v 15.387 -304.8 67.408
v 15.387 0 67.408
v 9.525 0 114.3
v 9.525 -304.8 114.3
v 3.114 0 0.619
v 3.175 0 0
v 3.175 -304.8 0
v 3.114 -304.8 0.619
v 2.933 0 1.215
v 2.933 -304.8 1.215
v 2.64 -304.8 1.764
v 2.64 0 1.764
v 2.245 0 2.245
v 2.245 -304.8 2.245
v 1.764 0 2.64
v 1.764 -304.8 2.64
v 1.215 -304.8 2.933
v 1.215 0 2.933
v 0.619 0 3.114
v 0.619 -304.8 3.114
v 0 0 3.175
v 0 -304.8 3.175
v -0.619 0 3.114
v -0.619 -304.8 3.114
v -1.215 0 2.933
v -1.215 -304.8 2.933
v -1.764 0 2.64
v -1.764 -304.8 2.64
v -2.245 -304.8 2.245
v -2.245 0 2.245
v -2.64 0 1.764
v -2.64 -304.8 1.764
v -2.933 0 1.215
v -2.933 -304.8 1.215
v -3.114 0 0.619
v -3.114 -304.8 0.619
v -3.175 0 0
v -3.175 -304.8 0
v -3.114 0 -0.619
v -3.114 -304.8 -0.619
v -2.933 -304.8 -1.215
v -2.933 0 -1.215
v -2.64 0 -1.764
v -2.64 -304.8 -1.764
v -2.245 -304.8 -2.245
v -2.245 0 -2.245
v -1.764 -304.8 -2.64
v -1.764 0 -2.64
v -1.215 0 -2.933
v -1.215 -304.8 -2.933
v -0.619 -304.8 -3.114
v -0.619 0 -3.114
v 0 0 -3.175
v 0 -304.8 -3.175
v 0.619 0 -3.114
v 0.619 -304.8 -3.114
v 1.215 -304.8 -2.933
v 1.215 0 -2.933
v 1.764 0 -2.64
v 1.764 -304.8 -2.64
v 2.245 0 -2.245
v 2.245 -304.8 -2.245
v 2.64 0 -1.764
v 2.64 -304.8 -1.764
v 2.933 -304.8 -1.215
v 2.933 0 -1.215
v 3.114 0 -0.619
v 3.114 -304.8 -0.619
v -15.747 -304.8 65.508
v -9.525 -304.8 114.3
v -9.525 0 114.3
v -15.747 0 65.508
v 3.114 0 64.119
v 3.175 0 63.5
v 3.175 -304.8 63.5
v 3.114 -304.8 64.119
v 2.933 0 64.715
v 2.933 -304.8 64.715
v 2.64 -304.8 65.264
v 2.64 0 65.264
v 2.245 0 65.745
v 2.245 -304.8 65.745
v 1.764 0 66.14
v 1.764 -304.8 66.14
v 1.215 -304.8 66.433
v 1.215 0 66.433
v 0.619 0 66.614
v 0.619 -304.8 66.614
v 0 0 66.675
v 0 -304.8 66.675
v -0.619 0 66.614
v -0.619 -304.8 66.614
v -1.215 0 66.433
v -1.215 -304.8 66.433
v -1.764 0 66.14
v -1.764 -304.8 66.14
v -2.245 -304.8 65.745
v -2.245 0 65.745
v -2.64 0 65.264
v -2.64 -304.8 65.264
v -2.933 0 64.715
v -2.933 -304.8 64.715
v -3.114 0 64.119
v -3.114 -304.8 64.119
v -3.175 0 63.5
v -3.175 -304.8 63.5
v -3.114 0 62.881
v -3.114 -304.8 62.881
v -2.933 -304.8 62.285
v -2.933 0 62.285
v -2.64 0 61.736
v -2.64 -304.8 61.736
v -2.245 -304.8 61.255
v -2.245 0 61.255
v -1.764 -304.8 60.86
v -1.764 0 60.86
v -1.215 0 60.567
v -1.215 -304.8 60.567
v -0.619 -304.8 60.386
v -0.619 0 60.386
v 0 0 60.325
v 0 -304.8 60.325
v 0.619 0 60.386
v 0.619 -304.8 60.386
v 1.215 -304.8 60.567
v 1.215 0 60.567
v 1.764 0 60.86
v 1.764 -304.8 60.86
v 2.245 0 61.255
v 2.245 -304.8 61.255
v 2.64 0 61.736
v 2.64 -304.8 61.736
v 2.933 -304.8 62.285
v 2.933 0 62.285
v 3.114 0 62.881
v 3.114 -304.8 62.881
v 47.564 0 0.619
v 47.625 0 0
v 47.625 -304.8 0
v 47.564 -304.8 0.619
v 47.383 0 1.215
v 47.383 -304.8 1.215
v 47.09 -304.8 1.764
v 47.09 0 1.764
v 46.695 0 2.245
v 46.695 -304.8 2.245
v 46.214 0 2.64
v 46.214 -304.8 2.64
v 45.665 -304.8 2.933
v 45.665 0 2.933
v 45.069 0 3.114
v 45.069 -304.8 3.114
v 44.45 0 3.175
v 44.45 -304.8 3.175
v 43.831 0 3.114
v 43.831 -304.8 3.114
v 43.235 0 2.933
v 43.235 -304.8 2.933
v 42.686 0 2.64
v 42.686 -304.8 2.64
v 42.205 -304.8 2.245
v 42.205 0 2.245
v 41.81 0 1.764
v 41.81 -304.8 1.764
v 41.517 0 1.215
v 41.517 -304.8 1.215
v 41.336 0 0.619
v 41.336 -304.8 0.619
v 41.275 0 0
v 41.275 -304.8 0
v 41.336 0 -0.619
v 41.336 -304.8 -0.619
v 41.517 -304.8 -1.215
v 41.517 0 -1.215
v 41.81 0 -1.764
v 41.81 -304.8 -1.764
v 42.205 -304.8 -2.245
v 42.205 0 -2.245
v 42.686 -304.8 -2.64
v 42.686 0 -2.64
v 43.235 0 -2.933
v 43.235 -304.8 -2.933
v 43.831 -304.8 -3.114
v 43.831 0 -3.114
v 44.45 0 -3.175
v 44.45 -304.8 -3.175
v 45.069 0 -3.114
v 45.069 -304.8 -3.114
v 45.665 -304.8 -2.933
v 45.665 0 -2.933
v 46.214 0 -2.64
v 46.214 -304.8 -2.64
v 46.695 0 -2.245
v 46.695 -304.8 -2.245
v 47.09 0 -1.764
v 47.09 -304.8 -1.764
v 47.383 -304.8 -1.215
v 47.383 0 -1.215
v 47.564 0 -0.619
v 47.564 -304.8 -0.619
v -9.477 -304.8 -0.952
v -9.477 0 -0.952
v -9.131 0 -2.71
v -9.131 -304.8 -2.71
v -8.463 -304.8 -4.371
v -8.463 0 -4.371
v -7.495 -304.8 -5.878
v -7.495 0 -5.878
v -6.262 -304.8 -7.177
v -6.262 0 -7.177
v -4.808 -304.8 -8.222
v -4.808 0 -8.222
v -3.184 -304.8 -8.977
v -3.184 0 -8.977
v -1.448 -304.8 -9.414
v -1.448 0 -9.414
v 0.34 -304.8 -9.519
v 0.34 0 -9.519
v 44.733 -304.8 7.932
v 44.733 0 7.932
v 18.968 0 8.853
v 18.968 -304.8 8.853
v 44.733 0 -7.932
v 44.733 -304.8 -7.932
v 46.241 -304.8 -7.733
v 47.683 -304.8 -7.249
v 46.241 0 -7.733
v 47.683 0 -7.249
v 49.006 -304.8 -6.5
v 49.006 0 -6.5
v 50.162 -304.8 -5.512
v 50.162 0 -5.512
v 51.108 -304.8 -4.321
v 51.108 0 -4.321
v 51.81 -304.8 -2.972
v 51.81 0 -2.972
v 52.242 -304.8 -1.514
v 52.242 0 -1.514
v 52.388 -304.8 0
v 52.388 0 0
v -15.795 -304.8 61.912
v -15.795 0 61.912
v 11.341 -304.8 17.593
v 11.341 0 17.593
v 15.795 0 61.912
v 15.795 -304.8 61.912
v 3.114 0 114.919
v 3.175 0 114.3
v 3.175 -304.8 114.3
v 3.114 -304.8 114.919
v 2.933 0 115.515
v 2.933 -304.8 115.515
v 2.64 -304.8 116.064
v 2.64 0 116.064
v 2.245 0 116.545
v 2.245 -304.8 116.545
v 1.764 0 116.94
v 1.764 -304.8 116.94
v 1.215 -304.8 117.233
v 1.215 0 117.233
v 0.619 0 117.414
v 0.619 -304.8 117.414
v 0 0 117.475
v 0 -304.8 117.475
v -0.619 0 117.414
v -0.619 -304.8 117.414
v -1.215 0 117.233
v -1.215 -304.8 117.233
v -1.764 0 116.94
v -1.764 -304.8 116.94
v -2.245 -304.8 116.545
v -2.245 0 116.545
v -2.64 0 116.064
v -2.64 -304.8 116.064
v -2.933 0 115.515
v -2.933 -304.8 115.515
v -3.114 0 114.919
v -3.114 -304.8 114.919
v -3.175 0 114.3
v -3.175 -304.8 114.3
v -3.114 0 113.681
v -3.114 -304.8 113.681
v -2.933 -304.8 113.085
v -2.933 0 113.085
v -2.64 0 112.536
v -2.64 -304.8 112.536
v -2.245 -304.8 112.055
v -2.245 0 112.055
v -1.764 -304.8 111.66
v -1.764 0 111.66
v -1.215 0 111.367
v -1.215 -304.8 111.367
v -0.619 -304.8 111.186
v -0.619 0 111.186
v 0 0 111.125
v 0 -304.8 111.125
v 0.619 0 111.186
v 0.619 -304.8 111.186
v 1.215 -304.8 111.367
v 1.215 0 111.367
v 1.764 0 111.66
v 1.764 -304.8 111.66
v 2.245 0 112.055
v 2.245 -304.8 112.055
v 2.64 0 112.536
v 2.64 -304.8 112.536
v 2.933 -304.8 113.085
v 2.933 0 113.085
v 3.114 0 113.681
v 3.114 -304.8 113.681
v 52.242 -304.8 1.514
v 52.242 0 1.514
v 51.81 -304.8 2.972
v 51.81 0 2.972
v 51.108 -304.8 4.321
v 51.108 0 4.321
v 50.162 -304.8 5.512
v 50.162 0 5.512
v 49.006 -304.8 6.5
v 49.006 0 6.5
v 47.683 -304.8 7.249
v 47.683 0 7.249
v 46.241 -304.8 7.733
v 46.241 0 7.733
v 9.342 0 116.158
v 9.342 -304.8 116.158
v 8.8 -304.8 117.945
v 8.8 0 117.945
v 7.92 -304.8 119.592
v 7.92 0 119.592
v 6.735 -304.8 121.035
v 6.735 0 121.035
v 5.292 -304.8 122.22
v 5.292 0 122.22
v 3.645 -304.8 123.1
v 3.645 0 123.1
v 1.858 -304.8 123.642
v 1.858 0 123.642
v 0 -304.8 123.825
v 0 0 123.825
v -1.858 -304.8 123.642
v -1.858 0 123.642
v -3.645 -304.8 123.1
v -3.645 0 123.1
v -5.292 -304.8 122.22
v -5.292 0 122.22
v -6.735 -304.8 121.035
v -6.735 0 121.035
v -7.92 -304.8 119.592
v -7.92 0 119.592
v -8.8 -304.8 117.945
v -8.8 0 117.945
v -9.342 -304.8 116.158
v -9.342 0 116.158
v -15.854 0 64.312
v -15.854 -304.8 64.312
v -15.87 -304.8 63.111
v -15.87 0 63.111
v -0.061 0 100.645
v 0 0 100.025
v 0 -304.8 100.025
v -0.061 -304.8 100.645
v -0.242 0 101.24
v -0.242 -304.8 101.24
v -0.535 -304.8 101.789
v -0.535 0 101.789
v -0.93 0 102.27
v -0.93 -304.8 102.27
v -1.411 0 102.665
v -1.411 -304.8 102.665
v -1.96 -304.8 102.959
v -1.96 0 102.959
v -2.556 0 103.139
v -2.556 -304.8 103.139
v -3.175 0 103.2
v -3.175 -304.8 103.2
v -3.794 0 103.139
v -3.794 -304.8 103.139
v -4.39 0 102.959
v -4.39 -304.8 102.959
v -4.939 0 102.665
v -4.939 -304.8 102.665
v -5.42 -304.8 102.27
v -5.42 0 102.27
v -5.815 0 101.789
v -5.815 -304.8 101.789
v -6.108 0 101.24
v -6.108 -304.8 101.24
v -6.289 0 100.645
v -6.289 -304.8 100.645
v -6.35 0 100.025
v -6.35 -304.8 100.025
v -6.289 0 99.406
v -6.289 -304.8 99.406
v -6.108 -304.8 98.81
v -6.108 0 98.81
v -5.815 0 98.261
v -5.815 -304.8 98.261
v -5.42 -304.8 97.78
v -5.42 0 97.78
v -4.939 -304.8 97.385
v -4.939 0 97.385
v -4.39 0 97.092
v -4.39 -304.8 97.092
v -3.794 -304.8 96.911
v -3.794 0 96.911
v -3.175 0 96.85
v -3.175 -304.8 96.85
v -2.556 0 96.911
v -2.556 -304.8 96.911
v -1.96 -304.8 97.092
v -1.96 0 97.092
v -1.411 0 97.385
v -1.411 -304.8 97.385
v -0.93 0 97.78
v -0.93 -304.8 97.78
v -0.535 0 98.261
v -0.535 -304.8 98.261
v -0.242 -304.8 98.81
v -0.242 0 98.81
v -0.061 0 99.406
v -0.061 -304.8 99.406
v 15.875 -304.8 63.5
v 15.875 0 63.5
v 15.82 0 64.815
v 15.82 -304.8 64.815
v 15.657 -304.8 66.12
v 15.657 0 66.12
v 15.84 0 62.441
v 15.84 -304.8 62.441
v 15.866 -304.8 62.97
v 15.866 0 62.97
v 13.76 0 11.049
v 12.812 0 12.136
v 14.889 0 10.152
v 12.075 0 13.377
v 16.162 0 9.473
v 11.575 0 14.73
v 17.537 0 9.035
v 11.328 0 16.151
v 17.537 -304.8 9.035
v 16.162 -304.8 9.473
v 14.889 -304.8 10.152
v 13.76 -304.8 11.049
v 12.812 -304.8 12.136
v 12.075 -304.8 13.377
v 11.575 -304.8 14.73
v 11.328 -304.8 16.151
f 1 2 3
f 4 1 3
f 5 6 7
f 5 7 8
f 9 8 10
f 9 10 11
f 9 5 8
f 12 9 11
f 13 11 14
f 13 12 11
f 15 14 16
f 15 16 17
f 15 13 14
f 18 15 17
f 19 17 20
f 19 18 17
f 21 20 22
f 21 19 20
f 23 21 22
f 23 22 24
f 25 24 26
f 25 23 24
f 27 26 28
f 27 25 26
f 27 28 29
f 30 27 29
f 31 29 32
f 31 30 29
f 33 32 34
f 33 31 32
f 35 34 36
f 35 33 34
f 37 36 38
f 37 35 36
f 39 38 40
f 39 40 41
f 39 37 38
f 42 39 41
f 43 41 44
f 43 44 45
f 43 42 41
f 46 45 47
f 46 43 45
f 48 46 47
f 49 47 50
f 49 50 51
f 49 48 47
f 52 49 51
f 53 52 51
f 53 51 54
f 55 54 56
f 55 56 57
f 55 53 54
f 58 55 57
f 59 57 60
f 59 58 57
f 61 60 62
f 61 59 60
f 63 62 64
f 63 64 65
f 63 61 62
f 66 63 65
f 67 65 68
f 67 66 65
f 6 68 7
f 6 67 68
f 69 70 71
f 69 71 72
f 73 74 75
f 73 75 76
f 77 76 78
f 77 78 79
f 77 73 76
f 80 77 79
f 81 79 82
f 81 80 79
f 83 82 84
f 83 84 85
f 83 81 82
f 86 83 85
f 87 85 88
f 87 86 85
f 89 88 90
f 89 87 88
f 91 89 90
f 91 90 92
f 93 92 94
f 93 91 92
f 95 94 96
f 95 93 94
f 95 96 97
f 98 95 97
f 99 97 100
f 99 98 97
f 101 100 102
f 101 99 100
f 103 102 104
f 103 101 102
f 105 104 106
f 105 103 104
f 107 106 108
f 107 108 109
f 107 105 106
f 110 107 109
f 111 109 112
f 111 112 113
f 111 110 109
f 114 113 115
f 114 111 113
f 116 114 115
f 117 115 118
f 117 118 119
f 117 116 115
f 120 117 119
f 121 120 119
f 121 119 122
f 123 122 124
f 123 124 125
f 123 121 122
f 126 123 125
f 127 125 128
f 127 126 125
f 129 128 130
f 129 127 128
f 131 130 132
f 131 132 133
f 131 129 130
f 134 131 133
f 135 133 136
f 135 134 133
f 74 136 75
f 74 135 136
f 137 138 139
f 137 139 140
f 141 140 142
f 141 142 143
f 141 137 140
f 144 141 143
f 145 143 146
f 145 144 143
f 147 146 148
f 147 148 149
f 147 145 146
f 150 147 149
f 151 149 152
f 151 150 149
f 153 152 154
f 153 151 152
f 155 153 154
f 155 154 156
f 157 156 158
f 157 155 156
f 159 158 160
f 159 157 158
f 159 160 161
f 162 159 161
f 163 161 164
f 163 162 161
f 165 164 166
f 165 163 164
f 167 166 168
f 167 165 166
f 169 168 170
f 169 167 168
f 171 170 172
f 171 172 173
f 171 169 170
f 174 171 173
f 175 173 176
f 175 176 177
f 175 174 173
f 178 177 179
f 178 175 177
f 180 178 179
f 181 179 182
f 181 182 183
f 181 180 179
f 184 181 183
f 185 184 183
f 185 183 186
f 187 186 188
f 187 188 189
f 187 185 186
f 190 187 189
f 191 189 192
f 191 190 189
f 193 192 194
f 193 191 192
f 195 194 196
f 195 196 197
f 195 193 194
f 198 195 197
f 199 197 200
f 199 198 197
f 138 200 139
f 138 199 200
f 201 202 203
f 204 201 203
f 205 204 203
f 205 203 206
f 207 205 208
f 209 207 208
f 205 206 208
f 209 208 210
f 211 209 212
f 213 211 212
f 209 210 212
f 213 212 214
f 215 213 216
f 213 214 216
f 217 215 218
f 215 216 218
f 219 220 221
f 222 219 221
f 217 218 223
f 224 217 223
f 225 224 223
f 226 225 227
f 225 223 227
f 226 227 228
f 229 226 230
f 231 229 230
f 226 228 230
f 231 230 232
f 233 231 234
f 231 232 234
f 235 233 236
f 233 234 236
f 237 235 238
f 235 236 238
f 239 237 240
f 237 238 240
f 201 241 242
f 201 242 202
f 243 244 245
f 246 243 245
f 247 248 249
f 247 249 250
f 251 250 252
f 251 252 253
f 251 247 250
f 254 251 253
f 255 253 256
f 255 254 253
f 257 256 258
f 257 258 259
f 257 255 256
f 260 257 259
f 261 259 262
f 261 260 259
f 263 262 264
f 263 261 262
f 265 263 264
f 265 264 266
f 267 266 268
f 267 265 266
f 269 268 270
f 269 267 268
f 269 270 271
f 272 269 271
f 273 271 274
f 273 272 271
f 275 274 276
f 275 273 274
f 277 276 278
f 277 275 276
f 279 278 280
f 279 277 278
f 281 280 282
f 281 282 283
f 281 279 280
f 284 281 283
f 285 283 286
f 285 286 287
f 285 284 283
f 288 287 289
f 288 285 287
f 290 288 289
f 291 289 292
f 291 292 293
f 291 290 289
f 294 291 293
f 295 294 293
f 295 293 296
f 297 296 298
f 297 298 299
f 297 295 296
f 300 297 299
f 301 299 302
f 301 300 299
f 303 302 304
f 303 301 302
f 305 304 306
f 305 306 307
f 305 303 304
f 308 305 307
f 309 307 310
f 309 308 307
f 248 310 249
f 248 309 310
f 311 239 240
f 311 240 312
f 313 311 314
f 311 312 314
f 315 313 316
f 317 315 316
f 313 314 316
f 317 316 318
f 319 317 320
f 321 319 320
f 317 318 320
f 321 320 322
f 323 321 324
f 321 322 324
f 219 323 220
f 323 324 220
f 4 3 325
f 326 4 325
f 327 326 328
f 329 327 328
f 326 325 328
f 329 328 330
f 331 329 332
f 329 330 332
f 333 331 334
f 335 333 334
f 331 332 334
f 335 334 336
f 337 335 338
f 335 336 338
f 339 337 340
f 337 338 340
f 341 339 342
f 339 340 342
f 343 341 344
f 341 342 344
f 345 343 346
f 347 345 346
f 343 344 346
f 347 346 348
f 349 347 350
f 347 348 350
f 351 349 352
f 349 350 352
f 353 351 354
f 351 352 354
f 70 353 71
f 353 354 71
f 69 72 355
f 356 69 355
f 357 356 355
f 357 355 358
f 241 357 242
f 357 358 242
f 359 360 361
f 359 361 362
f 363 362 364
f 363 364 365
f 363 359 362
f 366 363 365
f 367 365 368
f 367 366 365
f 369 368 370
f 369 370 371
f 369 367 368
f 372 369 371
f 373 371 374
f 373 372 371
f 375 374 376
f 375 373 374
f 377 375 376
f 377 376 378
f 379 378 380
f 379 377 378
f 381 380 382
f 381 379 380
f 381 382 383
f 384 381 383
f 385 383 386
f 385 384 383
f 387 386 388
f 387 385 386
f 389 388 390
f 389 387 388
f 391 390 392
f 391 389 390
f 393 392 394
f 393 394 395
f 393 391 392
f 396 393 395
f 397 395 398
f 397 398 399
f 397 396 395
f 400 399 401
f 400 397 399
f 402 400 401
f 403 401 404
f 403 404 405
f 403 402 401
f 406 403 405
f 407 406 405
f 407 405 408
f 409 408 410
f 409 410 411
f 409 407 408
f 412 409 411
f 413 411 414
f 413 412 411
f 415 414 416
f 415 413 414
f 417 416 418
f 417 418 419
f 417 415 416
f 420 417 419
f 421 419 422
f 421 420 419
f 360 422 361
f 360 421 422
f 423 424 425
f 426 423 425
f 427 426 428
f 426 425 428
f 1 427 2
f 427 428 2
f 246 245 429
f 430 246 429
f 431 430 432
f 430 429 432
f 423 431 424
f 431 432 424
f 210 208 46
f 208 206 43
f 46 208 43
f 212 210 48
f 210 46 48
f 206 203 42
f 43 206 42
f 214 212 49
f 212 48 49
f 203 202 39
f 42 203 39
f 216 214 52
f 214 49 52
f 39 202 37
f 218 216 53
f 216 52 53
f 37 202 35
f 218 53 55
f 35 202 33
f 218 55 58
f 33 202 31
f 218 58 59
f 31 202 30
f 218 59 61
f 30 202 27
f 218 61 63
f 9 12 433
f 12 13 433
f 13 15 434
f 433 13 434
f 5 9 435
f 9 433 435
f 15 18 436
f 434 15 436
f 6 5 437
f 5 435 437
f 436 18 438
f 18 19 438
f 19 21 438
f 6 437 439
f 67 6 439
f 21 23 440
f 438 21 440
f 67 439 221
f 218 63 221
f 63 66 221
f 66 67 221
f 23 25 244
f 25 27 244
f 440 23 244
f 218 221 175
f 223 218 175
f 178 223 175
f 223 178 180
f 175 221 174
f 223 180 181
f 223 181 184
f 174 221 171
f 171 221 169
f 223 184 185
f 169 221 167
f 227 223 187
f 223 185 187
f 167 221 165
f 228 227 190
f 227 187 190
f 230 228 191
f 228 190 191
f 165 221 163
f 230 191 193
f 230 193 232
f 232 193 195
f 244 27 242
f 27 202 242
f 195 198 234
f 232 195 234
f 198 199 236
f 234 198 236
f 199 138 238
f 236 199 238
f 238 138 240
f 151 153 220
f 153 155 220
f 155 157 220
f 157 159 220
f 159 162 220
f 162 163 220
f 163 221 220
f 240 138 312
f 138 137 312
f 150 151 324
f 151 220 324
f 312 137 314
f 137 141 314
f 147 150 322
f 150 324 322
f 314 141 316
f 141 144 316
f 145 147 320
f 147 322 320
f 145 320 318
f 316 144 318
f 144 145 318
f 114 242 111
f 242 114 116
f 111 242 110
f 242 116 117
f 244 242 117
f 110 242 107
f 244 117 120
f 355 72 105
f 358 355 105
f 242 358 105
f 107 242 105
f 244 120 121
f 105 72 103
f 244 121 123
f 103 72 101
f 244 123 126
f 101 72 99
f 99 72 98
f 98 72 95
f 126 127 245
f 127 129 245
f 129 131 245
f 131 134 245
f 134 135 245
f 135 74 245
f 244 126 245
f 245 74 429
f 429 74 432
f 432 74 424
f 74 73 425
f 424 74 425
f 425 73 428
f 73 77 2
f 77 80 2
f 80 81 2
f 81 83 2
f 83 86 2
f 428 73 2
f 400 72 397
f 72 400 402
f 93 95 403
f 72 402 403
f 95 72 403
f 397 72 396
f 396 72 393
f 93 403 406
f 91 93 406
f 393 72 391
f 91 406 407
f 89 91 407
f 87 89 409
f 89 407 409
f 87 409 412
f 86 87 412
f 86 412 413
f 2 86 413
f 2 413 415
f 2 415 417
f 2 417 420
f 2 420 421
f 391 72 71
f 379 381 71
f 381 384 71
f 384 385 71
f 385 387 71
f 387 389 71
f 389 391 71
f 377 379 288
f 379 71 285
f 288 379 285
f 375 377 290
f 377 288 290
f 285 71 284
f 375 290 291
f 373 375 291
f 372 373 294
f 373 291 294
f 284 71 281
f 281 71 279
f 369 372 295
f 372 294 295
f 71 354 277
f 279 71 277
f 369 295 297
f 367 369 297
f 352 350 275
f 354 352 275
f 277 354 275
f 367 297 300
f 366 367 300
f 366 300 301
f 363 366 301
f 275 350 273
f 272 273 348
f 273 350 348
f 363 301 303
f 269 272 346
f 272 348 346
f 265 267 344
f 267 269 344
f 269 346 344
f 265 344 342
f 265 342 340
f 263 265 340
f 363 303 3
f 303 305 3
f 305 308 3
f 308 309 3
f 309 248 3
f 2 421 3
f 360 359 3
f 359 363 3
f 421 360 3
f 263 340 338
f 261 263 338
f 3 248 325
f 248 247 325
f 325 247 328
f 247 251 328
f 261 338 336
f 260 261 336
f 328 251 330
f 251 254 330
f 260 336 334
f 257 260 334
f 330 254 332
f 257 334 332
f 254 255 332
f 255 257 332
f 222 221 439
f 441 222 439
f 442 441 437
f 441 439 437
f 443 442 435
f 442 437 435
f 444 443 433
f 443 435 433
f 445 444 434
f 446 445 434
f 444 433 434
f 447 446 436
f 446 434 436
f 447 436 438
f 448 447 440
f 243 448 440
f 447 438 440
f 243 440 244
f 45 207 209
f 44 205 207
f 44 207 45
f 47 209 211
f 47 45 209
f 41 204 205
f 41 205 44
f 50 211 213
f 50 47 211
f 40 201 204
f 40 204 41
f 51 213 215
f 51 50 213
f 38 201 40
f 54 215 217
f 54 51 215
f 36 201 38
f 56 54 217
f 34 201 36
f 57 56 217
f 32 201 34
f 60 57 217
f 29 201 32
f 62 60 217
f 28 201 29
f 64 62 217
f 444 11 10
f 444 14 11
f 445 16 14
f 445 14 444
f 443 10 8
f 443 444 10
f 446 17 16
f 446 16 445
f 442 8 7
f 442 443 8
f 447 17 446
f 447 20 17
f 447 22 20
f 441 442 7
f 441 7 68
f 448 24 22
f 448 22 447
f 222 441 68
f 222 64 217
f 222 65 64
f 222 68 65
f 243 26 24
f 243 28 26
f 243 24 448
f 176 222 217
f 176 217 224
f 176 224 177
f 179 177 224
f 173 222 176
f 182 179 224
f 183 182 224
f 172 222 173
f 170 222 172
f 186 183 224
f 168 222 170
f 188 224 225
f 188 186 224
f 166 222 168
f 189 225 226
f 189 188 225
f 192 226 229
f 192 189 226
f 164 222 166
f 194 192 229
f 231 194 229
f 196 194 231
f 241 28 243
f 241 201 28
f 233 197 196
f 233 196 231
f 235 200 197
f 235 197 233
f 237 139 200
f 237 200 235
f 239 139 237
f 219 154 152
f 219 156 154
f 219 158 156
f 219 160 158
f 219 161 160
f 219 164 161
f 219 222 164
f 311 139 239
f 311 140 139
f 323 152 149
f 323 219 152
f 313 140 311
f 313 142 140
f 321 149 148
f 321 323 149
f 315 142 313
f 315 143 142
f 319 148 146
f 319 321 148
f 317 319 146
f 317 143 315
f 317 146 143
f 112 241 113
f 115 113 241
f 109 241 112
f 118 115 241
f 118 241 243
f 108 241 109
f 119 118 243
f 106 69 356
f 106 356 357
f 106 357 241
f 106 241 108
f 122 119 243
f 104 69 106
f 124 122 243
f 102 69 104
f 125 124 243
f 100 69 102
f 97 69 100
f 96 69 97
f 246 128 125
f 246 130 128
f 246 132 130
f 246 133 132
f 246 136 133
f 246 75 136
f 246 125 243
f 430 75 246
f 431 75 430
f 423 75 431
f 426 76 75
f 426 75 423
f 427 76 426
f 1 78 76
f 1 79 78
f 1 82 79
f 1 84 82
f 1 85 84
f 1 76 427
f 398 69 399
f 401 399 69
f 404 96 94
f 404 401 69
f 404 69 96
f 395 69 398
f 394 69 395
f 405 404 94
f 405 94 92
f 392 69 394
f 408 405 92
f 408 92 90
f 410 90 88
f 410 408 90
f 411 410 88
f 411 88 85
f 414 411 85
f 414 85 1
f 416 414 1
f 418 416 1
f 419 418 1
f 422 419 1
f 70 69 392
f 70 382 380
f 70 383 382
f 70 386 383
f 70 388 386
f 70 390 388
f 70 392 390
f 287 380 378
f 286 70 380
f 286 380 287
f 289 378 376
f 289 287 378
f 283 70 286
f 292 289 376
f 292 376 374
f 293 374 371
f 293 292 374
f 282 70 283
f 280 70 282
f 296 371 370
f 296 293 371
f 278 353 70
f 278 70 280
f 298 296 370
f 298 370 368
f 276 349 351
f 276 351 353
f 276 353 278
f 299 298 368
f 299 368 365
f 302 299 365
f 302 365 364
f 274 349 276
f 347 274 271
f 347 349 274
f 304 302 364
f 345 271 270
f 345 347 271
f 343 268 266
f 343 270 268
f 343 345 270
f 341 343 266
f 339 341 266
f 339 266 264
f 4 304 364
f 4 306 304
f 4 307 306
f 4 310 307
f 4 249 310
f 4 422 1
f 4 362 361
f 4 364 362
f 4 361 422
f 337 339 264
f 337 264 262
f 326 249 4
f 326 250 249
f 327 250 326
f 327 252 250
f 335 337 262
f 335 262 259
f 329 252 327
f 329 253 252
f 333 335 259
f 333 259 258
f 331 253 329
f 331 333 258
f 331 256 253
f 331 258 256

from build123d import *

# Parameters (mm, degrees)
F0_R     = 3.175
F1_DEPTH = 304.8


with BuildPart() as f1:
    # F0 (on Front) → F1 (new body)
    with BuildSketch(Plane.XZ):
        with BuildLine():
            ThreePointArc((-9.525, 114.3), (0, 104.775), (9.525, 114.3))
            ThreePointArc((9.525, 114.3), (0, 123.825), (-9.525, 114.3))
        make_face()
        with Locations((0, 114.3)):
            Circle(F0_R, mode=Mode.SUBTRACT)
        with BuildLine():
            Line((15.386538, 67.407692), (9.525, 114.3))
            ThreePointArc((9.525, 114.3), (0, 104.775), (-9.525, 114.3))
            Line((-9.525, 114.3), (-15.747457, 65.50829))
            ThreePointArc((-15.747457, 65.50829), (-0.966694, 79.34554), (15.386538, 67.407692))
        make_face()
        with Locations((-3.175, 100.0252)):
            Circle(F0_R, mode=Mode.SUBTRACT)
        with BuildLine():
            Line((15.875, 63.5), (15.386538, 67.407692))
            ThreePointArc((15.386538, 67.407692), (-0.966694, 79.34554), (-15.747457, 65.50829))
            ThreePointArc((-15.747457, 65.50829), (-15.873588, 63.711757), (-15.795426, 61.9125))
            ThreePointArc((-15.795426, 61.9125), (0, 47.625), (15.795426, 61.9125))
            ThreePointArc((15.795426, 61.9125), (15.855094, 62.705253), (15.875, 63.5))
        make_face()
        with Locations((0, 63.5)):
            Circle(F0_R, mode=Mode.SUBTRACT)
        with BuildLine():
            ThreePointArc((15.875, 63.5), (15.752411, 65.469051), (15.386538, 67.407692))
            Line((15.386538, 67.407692), (15.875, 63.5))
        make_face()
        with BuildLine():
            ThreePointArc((15.795426, 61.9125), (0, 47.625), (-15.795426, 61.9125))
            Line((-15.795426, 61.9125), (-9.477255, -0.9525))
            ThreePointArc((-9.477255, -0.9525), (-0.476848, 9.513056), (9.525, 0))
            ThreePointArc((9.525, 0), (6.854408, -6.613827), (0.340179, -9.518923))
            Line((0.340179, -9.518923), (44.733482, -7.932436))
            ThreePointArc((44.733482, -7.932436), (36.5125, 0), (44.733482, 7.932436))
            Line((44.733482, 7.932436), (18.9676, 8.853234))
            ThreePointArc((18.9676, 8.853234), (13.2612, 11.571359), (11.341187, 17.593382))
            Line((11.341187, 17.593382), (15.795426, 61.9125))
        make_face()
        with BuildLine():
            ThreePointArc((9.525, 0), (-0.476848, 9.513056), (-9.477255, -0.9525))
            ThreePointArc((-9.477255, -0.9525), (-6.262383, -7.17692), (0.340179, -9.518923))
            ThreePointArc((0.340179, -9.518923), (6.854408, -6.613827), (9.525, 0))
        make_face()
        Circle(F0_R, mode=Mode.SUBTRACT)
        with BuildLine():
            ThreePointArc((44.733482, 7.932436), (36.5125, 0), (44.733482, -7.932436))
            ThreePointArc((44.733482, -7.932436), (50.162007, -5.511523), (52.3875, 0))
            ThreePointArc((52.3875, 0), (50.162007, 5.511523), (44.733482, 7.932436))
        make_face()
        with Locations((44.45, 0)):
            Circle(F0_R, mode=Mode.SUBTRACT)
    extrude(amount=F1_DEPTH)


solid = f1.part
